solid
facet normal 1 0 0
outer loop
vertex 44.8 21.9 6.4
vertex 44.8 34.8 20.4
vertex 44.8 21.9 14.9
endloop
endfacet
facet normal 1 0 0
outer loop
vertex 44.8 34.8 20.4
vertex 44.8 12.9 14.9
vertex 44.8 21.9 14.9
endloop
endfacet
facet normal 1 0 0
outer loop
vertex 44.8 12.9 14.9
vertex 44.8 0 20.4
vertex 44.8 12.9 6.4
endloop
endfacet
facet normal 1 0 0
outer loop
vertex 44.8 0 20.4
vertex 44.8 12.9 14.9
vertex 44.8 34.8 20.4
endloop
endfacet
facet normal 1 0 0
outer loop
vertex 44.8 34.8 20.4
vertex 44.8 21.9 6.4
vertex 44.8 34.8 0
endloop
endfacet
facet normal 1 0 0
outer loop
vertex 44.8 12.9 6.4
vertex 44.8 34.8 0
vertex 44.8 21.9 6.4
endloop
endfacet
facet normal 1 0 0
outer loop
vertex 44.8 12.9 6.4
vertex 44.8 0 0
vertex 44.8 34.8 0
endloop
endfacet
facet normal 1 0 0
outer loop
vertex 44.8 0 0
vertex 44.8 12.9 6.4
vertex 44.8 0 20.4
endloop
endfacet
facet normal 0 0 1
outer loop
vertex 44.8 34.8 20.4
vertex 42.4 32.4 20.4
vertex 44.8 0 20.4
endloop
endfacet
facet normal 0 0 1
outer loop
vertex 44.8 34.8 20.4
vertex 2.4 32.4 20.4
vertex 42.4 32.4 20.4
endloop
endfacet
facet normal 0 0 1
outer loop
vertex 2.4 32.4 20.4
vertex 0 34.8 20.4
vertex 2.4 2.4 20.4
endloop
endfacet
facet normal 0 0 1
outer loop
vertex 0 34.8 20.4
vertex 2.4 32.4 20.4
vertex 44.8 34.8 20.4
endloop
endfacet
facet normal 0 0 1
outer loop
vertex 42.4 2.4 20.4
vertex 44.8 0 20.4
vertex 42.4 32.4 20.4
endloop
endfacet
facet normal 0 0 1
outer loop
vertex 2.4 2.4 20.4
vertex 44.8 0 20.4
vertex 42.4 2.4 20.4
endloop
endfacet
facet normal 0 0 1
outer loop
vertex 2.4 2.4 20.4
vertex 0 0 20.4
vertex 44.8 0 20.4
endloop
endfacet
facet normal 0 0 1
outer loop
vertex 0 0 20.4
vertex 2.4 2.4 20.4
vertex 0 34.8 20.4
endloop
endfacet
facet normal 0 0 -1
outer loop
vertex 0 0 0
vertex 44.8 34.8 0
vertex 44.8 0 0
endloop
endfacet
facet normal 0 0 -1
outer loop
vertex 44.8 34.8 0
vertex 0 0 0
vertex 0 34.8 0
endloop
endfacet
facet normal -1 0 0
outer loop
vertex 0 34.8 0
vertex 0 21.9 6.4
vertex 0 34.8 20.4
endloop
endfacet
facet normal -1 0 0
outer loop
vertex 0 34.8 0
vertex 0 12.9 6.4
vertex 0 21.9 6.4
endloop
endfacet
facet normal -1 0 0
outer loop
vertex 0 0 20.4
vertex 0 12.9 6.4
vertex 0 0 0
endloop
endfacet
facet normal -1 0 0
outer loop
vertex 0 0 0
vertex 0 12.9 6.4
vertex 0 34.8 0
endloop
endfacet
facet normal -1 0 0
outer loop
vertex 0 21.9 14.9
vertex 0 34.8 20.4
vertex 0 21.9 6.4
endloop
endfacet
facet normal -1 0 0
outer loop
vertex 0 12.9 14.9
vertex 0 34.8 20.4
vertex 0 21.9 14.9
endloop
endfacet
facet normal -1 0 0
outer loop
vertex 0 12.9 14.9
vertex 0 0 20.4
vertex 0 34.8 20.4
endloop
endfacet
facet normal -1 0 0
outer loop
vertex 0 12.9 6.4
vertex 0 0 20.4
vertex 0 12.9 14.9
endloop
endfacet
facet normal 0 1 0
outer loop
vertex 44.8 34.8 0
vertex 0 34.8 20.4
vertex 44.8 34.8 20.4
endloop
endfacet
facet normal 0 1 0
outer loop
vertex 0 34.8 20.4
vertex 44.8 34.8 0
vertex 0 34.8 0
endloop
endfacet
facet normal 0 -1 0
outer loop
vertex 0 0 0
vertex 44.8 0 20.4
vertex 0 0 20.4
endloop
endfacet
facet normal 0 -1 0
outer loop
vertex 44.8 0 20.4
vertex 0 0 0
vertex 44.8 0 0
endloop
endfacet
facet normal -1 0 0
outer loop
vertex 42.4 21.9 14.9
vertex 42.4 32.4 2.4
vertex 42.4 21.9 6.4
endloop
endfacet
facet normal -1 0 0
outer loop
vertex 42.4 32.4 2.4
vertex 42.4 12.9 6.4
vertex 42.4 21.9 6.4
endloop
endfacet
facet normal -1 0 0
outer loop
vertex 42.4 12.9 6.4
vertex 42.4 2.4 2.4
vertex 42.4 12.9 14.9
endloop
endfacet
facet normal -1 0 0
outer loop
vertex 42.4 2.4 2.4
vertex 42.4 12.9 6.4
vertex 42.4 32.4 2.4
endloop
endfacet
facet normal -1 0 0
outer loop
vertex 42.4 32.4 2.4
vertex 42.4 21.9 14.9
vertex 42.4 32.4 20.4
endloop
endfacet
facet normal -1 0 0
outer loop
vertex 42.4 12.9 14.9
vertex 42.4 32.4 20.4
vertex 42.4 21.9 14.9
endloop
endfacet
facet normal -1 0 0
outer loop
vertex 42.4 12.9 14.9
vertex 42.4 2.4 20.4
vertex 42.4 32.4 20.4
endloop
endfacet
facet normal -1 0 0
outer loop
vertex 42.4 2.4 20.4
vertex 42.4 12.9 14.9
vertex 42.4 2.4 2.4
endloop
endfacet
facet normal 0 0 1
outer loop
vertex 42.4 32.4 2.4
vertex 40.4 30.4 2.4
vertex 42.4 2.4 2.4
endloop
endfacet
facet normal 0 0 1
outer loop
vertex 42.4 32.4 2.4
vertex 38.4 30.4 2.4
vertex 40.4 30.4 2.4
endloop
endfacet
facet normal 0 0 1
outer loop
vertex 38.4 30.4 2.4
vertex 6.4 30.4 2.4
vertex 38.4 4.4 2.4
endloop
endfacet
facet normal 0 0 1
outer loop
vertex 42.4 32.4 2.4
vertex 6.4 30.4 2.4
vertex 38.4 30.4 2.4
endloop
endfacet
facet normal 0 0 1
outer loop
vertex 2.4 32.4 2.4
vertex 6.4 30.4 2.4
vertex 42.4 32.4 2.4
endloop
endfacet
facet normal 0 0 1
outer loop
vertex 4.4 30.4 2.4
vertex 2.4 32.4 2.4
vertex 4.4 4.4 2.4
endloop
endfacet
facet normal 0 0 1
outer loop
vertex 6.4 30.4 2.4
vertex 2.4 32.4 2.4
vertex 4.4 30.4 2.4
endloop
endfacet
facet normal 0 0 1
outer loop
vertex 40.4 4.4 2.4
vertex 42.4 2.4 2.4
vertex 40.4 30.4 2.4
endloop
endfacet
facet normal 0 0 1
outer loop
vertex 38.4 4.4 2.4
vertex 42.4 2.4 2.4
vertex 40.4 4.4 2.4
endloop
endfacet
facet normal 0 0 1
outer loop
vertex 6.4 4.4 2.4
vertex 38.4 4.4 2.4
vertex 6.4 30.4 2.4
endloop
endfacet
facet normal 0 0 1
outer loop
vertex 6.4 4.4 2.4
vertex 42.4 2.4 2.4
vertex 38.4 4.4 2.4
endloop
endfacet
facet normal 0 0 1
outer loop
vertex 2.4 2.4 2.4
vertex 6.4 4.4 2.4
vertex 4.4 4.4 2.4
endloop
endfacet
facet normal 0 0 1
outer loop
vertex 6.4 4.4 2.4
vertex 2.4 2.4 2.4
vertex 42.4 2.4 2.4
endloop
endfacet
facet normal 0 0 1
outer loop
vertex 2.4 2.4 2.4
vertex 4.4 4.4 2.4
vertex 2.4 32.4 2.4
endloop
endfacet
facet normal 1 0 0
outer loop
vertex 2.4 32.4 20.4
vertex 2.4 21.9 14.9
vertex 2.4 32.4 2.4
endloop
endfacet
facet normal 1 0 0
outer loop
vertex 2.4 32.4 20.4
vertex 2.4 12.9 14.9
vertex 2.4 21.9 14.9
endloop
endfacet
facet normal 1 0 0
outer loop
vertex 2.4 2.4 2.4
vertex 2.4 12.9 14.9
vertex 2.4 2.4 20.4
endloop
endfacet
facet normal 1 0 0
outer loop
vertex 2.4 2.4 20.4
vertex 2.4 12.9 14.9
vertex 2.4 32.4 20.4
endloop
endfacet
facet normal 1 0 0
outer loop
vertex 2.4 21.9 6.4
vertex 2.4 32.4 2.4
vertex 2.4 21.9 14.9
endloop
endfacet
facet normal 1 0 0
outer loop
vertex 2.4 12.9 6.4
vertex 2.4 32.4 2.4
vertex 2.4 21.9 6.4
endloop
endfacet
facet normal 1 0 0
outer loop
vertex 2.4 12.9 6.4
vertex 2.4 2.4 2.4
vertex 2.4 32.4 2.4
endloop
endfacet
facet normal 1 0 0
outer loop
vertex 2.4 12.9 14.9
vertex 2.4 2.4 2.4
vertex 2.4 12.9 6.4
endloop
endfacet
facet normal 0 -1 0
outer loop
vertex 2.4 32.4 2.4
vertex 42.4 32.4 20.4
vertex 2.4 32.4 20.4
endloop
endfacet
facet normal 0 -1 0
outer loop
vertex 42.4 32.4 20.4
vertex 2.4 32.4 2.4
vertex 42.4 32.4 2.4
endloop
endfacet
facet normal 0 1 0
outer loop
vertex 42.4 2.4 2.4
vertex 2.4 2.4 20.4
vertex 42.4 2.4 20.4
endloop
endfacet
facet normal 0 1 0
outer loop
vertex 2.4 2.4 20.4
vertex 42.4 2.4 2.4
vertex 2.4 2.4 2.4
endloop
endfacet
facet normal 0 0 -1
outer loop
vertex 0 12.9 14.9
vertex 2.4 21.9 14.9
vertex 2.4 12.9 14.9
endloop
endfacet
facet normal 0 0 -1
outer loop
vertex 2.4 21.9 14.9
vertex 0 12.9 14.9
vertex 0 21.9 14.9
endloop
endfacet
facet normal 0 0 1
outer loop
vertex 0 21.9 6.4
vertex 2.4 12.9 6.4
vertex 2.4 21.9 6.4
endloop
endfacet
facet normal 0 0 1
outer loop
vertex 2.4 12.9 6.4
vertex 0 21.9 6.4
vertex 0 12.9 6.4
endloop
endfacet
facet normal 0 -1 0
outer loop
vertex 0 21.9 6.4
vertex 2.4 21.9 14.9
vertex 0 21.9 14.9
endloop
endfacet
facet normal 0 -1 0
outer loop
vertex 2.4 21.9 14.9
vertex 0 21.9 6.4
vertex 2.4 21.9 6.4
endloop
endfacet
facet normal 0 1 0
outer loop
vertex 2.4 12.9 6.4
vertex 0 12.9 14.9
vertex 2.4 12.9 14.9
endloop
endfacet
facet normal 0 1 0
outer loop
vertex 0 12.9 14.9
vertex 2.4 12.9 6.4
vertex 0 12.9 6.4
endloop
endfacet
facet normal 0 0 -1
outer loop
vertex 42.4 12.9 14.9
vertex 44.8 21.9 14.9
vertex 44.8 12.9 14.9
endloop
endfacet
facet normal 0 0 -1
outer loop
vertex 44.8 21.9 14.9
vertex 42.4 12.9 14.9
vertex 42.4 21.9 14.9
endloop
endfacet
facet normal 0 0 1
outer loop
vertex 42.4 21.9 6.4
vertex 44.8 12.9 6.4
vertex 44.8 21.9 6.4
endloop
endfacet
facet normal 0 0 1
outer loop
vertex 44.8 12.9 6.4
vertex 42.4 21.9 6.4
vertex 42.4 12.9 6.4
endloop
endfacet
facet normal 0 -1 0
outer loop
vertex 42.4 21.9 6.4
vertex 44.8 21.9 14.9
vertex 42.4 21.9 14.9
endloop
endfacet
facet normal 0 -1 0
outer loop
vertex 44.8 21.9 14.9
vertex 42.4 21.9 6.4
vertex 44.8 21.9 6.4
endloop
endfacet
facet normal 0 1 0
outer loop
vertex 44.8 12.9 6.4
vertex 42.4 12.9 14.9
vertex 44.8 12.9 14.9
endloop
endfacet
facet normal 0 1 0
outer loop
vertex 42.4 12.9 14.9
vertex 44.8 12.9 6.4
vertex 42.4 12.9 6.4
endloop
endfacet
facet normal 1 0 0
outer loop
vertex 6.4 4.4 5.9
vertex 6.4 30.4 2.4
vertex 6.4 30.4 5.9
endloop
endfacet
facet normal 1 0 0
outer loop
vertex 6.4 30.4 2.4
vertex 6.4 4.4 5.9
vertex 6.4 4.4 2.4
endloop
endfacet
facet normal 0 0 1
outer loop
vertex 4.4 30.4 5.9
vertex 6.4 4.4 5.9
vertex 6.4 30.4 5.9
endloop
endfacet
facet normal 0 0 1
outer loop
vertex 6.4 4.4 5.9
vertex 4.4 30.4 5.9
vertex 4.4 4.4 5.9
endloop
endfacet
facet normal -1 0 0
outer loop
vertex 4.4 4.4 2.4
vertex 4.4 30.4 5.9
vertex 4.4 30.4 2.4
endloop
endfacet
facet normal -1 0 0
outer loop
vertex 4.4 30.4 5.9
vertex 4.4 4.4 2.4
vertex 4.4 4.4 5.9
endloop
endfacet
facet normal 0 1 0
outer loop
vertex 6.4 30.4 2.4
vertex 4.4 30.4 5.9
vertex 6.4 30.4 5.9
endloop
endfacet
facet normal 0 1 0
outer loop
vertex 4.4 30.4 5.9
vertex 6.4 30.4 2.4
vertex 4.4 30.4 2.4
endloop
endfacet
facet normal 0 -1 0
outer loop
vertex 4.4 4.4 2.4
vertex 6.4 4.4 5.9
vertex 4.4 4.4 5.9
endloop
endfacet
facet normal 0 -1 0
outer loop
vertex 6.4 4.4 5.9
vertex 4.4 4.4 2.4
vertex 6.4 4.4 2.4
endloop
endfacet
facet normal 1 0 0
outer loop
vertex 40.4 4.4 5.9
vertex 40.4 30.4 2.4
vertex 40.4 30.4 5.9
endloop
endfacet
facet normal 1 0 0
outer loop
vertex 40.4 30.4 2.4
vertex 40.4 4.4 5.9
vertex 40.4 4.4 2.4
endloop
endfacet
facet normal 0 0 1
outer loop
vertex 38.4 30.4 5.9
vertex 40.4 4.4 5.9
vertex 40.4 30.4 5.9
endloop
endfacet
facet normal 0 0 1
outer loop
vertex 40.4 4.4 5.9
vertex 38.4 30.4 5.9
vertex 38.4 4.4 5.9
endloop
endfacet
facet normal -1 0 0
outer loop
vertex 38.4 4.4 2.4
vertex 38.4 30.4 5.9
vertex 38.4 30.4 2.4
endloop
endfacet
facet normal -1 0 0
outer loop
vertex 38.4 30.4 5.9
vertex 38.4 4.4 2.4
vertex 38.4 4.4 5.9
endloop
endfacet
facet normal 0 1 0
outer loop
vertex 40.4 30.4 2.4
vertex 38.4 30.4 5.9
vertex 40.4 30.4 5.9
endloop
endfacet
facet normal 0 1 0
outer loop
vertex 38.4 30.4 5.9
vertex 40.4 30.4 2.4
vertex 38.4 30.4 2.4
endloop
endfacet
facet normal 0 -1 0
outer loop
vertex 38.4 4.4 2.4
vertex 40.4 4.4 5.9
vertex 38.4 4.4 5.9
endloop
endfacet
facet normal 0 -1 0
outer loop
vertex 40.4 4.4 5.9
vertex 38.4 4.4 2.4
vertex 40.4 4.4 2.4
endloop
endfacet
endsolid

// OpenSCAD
/*
  BK-KLINE-R1 original PCB protection case, REV R1, NOT tested.
  PCB outer size, connector placement and standoff positions MUST be
  checked after KiCad layout. Intended for small U1/R1/R2/C1/C2 board
  with protected automobile 5V DC/DC positioned OUTSIDE this case.
  Unit mm. Change part and export an STL separately.
*/
$fn=48;
part="base"; // "base" | "lid" | "layout"

// provisional PCB size — not a promise that this PCB has already been routed
pcb_x=36;
pcb_y=26;
pcb_z=1.6;
free_edge=2.0;
wall=2.4;
floor_h=2.4;
inside_h=18.0;
lid_th=2.0;
lid_lip_h=2.4;
lid_slop=0.4;
support_rail_w=2.0;
support_rail_h=3.5;
cable_slot_w=9.0;
cable_slot_h=8.5;

inner_x=pcb_x+2*free_edge;
inner_y=pcb_y+2*free_edge;
box_x=inner_x+2*wall;
box_y=inner_y+2*wall;

module base(){
    union(){
        difference(){
            cube([box_x,box_y,inside_h+floor_h]);
            translate([wall,wall,floor_h])
                cube([inner_x,inner_y,inside_h+0.1]);
            // Grommet openings: confirm actual wire direction before printing
            translate([-0.1,(box_y-cable_slot_w)/2,floor_h+4])
                cube([wall+0.2,cable_slot_w,cable_slot_h]);
            translate([box_x-wall-0.1,(box_y-cable_slot_w)/2,floor_h+4])
                cube([wall+0.2,cable_slot_w,cable_slot_h]);
        }
        // PCB edge rails, no guessed hole locations
        translate([wall+free_edge,wall+free_edge,floor_h])
            cube([support_rail_w,pcb_y,support_rail_h]);
        translate([wall+free_edge+pcb_x-support_rail_w,wall+free_edge,floor_h])
            cube([support_rail_w,pcb_y,support_rail_h]);
    }
}
module lid(){
    union(){
        cube([box_x,box_y,lid_th]);
        translate([wall+lid_slop,wall+lid_slop,lid_th])
            difference(){
                cube([inner_x-2*lid_slop,inner_y-2*lid_slop,lid_lip_h]);
                translate([2,2,-0.1])
                    cube([inner_x-2*lid_slop-4,inner_y-2*lid_slop-4,lid_lip_h+0.2]);
            }
    }
}
if(part=="base") base();
else if(part=="lid") lid();
else if(part=="layout"){
    base();
    translate([box_x+8,0,0]) lid();
}
